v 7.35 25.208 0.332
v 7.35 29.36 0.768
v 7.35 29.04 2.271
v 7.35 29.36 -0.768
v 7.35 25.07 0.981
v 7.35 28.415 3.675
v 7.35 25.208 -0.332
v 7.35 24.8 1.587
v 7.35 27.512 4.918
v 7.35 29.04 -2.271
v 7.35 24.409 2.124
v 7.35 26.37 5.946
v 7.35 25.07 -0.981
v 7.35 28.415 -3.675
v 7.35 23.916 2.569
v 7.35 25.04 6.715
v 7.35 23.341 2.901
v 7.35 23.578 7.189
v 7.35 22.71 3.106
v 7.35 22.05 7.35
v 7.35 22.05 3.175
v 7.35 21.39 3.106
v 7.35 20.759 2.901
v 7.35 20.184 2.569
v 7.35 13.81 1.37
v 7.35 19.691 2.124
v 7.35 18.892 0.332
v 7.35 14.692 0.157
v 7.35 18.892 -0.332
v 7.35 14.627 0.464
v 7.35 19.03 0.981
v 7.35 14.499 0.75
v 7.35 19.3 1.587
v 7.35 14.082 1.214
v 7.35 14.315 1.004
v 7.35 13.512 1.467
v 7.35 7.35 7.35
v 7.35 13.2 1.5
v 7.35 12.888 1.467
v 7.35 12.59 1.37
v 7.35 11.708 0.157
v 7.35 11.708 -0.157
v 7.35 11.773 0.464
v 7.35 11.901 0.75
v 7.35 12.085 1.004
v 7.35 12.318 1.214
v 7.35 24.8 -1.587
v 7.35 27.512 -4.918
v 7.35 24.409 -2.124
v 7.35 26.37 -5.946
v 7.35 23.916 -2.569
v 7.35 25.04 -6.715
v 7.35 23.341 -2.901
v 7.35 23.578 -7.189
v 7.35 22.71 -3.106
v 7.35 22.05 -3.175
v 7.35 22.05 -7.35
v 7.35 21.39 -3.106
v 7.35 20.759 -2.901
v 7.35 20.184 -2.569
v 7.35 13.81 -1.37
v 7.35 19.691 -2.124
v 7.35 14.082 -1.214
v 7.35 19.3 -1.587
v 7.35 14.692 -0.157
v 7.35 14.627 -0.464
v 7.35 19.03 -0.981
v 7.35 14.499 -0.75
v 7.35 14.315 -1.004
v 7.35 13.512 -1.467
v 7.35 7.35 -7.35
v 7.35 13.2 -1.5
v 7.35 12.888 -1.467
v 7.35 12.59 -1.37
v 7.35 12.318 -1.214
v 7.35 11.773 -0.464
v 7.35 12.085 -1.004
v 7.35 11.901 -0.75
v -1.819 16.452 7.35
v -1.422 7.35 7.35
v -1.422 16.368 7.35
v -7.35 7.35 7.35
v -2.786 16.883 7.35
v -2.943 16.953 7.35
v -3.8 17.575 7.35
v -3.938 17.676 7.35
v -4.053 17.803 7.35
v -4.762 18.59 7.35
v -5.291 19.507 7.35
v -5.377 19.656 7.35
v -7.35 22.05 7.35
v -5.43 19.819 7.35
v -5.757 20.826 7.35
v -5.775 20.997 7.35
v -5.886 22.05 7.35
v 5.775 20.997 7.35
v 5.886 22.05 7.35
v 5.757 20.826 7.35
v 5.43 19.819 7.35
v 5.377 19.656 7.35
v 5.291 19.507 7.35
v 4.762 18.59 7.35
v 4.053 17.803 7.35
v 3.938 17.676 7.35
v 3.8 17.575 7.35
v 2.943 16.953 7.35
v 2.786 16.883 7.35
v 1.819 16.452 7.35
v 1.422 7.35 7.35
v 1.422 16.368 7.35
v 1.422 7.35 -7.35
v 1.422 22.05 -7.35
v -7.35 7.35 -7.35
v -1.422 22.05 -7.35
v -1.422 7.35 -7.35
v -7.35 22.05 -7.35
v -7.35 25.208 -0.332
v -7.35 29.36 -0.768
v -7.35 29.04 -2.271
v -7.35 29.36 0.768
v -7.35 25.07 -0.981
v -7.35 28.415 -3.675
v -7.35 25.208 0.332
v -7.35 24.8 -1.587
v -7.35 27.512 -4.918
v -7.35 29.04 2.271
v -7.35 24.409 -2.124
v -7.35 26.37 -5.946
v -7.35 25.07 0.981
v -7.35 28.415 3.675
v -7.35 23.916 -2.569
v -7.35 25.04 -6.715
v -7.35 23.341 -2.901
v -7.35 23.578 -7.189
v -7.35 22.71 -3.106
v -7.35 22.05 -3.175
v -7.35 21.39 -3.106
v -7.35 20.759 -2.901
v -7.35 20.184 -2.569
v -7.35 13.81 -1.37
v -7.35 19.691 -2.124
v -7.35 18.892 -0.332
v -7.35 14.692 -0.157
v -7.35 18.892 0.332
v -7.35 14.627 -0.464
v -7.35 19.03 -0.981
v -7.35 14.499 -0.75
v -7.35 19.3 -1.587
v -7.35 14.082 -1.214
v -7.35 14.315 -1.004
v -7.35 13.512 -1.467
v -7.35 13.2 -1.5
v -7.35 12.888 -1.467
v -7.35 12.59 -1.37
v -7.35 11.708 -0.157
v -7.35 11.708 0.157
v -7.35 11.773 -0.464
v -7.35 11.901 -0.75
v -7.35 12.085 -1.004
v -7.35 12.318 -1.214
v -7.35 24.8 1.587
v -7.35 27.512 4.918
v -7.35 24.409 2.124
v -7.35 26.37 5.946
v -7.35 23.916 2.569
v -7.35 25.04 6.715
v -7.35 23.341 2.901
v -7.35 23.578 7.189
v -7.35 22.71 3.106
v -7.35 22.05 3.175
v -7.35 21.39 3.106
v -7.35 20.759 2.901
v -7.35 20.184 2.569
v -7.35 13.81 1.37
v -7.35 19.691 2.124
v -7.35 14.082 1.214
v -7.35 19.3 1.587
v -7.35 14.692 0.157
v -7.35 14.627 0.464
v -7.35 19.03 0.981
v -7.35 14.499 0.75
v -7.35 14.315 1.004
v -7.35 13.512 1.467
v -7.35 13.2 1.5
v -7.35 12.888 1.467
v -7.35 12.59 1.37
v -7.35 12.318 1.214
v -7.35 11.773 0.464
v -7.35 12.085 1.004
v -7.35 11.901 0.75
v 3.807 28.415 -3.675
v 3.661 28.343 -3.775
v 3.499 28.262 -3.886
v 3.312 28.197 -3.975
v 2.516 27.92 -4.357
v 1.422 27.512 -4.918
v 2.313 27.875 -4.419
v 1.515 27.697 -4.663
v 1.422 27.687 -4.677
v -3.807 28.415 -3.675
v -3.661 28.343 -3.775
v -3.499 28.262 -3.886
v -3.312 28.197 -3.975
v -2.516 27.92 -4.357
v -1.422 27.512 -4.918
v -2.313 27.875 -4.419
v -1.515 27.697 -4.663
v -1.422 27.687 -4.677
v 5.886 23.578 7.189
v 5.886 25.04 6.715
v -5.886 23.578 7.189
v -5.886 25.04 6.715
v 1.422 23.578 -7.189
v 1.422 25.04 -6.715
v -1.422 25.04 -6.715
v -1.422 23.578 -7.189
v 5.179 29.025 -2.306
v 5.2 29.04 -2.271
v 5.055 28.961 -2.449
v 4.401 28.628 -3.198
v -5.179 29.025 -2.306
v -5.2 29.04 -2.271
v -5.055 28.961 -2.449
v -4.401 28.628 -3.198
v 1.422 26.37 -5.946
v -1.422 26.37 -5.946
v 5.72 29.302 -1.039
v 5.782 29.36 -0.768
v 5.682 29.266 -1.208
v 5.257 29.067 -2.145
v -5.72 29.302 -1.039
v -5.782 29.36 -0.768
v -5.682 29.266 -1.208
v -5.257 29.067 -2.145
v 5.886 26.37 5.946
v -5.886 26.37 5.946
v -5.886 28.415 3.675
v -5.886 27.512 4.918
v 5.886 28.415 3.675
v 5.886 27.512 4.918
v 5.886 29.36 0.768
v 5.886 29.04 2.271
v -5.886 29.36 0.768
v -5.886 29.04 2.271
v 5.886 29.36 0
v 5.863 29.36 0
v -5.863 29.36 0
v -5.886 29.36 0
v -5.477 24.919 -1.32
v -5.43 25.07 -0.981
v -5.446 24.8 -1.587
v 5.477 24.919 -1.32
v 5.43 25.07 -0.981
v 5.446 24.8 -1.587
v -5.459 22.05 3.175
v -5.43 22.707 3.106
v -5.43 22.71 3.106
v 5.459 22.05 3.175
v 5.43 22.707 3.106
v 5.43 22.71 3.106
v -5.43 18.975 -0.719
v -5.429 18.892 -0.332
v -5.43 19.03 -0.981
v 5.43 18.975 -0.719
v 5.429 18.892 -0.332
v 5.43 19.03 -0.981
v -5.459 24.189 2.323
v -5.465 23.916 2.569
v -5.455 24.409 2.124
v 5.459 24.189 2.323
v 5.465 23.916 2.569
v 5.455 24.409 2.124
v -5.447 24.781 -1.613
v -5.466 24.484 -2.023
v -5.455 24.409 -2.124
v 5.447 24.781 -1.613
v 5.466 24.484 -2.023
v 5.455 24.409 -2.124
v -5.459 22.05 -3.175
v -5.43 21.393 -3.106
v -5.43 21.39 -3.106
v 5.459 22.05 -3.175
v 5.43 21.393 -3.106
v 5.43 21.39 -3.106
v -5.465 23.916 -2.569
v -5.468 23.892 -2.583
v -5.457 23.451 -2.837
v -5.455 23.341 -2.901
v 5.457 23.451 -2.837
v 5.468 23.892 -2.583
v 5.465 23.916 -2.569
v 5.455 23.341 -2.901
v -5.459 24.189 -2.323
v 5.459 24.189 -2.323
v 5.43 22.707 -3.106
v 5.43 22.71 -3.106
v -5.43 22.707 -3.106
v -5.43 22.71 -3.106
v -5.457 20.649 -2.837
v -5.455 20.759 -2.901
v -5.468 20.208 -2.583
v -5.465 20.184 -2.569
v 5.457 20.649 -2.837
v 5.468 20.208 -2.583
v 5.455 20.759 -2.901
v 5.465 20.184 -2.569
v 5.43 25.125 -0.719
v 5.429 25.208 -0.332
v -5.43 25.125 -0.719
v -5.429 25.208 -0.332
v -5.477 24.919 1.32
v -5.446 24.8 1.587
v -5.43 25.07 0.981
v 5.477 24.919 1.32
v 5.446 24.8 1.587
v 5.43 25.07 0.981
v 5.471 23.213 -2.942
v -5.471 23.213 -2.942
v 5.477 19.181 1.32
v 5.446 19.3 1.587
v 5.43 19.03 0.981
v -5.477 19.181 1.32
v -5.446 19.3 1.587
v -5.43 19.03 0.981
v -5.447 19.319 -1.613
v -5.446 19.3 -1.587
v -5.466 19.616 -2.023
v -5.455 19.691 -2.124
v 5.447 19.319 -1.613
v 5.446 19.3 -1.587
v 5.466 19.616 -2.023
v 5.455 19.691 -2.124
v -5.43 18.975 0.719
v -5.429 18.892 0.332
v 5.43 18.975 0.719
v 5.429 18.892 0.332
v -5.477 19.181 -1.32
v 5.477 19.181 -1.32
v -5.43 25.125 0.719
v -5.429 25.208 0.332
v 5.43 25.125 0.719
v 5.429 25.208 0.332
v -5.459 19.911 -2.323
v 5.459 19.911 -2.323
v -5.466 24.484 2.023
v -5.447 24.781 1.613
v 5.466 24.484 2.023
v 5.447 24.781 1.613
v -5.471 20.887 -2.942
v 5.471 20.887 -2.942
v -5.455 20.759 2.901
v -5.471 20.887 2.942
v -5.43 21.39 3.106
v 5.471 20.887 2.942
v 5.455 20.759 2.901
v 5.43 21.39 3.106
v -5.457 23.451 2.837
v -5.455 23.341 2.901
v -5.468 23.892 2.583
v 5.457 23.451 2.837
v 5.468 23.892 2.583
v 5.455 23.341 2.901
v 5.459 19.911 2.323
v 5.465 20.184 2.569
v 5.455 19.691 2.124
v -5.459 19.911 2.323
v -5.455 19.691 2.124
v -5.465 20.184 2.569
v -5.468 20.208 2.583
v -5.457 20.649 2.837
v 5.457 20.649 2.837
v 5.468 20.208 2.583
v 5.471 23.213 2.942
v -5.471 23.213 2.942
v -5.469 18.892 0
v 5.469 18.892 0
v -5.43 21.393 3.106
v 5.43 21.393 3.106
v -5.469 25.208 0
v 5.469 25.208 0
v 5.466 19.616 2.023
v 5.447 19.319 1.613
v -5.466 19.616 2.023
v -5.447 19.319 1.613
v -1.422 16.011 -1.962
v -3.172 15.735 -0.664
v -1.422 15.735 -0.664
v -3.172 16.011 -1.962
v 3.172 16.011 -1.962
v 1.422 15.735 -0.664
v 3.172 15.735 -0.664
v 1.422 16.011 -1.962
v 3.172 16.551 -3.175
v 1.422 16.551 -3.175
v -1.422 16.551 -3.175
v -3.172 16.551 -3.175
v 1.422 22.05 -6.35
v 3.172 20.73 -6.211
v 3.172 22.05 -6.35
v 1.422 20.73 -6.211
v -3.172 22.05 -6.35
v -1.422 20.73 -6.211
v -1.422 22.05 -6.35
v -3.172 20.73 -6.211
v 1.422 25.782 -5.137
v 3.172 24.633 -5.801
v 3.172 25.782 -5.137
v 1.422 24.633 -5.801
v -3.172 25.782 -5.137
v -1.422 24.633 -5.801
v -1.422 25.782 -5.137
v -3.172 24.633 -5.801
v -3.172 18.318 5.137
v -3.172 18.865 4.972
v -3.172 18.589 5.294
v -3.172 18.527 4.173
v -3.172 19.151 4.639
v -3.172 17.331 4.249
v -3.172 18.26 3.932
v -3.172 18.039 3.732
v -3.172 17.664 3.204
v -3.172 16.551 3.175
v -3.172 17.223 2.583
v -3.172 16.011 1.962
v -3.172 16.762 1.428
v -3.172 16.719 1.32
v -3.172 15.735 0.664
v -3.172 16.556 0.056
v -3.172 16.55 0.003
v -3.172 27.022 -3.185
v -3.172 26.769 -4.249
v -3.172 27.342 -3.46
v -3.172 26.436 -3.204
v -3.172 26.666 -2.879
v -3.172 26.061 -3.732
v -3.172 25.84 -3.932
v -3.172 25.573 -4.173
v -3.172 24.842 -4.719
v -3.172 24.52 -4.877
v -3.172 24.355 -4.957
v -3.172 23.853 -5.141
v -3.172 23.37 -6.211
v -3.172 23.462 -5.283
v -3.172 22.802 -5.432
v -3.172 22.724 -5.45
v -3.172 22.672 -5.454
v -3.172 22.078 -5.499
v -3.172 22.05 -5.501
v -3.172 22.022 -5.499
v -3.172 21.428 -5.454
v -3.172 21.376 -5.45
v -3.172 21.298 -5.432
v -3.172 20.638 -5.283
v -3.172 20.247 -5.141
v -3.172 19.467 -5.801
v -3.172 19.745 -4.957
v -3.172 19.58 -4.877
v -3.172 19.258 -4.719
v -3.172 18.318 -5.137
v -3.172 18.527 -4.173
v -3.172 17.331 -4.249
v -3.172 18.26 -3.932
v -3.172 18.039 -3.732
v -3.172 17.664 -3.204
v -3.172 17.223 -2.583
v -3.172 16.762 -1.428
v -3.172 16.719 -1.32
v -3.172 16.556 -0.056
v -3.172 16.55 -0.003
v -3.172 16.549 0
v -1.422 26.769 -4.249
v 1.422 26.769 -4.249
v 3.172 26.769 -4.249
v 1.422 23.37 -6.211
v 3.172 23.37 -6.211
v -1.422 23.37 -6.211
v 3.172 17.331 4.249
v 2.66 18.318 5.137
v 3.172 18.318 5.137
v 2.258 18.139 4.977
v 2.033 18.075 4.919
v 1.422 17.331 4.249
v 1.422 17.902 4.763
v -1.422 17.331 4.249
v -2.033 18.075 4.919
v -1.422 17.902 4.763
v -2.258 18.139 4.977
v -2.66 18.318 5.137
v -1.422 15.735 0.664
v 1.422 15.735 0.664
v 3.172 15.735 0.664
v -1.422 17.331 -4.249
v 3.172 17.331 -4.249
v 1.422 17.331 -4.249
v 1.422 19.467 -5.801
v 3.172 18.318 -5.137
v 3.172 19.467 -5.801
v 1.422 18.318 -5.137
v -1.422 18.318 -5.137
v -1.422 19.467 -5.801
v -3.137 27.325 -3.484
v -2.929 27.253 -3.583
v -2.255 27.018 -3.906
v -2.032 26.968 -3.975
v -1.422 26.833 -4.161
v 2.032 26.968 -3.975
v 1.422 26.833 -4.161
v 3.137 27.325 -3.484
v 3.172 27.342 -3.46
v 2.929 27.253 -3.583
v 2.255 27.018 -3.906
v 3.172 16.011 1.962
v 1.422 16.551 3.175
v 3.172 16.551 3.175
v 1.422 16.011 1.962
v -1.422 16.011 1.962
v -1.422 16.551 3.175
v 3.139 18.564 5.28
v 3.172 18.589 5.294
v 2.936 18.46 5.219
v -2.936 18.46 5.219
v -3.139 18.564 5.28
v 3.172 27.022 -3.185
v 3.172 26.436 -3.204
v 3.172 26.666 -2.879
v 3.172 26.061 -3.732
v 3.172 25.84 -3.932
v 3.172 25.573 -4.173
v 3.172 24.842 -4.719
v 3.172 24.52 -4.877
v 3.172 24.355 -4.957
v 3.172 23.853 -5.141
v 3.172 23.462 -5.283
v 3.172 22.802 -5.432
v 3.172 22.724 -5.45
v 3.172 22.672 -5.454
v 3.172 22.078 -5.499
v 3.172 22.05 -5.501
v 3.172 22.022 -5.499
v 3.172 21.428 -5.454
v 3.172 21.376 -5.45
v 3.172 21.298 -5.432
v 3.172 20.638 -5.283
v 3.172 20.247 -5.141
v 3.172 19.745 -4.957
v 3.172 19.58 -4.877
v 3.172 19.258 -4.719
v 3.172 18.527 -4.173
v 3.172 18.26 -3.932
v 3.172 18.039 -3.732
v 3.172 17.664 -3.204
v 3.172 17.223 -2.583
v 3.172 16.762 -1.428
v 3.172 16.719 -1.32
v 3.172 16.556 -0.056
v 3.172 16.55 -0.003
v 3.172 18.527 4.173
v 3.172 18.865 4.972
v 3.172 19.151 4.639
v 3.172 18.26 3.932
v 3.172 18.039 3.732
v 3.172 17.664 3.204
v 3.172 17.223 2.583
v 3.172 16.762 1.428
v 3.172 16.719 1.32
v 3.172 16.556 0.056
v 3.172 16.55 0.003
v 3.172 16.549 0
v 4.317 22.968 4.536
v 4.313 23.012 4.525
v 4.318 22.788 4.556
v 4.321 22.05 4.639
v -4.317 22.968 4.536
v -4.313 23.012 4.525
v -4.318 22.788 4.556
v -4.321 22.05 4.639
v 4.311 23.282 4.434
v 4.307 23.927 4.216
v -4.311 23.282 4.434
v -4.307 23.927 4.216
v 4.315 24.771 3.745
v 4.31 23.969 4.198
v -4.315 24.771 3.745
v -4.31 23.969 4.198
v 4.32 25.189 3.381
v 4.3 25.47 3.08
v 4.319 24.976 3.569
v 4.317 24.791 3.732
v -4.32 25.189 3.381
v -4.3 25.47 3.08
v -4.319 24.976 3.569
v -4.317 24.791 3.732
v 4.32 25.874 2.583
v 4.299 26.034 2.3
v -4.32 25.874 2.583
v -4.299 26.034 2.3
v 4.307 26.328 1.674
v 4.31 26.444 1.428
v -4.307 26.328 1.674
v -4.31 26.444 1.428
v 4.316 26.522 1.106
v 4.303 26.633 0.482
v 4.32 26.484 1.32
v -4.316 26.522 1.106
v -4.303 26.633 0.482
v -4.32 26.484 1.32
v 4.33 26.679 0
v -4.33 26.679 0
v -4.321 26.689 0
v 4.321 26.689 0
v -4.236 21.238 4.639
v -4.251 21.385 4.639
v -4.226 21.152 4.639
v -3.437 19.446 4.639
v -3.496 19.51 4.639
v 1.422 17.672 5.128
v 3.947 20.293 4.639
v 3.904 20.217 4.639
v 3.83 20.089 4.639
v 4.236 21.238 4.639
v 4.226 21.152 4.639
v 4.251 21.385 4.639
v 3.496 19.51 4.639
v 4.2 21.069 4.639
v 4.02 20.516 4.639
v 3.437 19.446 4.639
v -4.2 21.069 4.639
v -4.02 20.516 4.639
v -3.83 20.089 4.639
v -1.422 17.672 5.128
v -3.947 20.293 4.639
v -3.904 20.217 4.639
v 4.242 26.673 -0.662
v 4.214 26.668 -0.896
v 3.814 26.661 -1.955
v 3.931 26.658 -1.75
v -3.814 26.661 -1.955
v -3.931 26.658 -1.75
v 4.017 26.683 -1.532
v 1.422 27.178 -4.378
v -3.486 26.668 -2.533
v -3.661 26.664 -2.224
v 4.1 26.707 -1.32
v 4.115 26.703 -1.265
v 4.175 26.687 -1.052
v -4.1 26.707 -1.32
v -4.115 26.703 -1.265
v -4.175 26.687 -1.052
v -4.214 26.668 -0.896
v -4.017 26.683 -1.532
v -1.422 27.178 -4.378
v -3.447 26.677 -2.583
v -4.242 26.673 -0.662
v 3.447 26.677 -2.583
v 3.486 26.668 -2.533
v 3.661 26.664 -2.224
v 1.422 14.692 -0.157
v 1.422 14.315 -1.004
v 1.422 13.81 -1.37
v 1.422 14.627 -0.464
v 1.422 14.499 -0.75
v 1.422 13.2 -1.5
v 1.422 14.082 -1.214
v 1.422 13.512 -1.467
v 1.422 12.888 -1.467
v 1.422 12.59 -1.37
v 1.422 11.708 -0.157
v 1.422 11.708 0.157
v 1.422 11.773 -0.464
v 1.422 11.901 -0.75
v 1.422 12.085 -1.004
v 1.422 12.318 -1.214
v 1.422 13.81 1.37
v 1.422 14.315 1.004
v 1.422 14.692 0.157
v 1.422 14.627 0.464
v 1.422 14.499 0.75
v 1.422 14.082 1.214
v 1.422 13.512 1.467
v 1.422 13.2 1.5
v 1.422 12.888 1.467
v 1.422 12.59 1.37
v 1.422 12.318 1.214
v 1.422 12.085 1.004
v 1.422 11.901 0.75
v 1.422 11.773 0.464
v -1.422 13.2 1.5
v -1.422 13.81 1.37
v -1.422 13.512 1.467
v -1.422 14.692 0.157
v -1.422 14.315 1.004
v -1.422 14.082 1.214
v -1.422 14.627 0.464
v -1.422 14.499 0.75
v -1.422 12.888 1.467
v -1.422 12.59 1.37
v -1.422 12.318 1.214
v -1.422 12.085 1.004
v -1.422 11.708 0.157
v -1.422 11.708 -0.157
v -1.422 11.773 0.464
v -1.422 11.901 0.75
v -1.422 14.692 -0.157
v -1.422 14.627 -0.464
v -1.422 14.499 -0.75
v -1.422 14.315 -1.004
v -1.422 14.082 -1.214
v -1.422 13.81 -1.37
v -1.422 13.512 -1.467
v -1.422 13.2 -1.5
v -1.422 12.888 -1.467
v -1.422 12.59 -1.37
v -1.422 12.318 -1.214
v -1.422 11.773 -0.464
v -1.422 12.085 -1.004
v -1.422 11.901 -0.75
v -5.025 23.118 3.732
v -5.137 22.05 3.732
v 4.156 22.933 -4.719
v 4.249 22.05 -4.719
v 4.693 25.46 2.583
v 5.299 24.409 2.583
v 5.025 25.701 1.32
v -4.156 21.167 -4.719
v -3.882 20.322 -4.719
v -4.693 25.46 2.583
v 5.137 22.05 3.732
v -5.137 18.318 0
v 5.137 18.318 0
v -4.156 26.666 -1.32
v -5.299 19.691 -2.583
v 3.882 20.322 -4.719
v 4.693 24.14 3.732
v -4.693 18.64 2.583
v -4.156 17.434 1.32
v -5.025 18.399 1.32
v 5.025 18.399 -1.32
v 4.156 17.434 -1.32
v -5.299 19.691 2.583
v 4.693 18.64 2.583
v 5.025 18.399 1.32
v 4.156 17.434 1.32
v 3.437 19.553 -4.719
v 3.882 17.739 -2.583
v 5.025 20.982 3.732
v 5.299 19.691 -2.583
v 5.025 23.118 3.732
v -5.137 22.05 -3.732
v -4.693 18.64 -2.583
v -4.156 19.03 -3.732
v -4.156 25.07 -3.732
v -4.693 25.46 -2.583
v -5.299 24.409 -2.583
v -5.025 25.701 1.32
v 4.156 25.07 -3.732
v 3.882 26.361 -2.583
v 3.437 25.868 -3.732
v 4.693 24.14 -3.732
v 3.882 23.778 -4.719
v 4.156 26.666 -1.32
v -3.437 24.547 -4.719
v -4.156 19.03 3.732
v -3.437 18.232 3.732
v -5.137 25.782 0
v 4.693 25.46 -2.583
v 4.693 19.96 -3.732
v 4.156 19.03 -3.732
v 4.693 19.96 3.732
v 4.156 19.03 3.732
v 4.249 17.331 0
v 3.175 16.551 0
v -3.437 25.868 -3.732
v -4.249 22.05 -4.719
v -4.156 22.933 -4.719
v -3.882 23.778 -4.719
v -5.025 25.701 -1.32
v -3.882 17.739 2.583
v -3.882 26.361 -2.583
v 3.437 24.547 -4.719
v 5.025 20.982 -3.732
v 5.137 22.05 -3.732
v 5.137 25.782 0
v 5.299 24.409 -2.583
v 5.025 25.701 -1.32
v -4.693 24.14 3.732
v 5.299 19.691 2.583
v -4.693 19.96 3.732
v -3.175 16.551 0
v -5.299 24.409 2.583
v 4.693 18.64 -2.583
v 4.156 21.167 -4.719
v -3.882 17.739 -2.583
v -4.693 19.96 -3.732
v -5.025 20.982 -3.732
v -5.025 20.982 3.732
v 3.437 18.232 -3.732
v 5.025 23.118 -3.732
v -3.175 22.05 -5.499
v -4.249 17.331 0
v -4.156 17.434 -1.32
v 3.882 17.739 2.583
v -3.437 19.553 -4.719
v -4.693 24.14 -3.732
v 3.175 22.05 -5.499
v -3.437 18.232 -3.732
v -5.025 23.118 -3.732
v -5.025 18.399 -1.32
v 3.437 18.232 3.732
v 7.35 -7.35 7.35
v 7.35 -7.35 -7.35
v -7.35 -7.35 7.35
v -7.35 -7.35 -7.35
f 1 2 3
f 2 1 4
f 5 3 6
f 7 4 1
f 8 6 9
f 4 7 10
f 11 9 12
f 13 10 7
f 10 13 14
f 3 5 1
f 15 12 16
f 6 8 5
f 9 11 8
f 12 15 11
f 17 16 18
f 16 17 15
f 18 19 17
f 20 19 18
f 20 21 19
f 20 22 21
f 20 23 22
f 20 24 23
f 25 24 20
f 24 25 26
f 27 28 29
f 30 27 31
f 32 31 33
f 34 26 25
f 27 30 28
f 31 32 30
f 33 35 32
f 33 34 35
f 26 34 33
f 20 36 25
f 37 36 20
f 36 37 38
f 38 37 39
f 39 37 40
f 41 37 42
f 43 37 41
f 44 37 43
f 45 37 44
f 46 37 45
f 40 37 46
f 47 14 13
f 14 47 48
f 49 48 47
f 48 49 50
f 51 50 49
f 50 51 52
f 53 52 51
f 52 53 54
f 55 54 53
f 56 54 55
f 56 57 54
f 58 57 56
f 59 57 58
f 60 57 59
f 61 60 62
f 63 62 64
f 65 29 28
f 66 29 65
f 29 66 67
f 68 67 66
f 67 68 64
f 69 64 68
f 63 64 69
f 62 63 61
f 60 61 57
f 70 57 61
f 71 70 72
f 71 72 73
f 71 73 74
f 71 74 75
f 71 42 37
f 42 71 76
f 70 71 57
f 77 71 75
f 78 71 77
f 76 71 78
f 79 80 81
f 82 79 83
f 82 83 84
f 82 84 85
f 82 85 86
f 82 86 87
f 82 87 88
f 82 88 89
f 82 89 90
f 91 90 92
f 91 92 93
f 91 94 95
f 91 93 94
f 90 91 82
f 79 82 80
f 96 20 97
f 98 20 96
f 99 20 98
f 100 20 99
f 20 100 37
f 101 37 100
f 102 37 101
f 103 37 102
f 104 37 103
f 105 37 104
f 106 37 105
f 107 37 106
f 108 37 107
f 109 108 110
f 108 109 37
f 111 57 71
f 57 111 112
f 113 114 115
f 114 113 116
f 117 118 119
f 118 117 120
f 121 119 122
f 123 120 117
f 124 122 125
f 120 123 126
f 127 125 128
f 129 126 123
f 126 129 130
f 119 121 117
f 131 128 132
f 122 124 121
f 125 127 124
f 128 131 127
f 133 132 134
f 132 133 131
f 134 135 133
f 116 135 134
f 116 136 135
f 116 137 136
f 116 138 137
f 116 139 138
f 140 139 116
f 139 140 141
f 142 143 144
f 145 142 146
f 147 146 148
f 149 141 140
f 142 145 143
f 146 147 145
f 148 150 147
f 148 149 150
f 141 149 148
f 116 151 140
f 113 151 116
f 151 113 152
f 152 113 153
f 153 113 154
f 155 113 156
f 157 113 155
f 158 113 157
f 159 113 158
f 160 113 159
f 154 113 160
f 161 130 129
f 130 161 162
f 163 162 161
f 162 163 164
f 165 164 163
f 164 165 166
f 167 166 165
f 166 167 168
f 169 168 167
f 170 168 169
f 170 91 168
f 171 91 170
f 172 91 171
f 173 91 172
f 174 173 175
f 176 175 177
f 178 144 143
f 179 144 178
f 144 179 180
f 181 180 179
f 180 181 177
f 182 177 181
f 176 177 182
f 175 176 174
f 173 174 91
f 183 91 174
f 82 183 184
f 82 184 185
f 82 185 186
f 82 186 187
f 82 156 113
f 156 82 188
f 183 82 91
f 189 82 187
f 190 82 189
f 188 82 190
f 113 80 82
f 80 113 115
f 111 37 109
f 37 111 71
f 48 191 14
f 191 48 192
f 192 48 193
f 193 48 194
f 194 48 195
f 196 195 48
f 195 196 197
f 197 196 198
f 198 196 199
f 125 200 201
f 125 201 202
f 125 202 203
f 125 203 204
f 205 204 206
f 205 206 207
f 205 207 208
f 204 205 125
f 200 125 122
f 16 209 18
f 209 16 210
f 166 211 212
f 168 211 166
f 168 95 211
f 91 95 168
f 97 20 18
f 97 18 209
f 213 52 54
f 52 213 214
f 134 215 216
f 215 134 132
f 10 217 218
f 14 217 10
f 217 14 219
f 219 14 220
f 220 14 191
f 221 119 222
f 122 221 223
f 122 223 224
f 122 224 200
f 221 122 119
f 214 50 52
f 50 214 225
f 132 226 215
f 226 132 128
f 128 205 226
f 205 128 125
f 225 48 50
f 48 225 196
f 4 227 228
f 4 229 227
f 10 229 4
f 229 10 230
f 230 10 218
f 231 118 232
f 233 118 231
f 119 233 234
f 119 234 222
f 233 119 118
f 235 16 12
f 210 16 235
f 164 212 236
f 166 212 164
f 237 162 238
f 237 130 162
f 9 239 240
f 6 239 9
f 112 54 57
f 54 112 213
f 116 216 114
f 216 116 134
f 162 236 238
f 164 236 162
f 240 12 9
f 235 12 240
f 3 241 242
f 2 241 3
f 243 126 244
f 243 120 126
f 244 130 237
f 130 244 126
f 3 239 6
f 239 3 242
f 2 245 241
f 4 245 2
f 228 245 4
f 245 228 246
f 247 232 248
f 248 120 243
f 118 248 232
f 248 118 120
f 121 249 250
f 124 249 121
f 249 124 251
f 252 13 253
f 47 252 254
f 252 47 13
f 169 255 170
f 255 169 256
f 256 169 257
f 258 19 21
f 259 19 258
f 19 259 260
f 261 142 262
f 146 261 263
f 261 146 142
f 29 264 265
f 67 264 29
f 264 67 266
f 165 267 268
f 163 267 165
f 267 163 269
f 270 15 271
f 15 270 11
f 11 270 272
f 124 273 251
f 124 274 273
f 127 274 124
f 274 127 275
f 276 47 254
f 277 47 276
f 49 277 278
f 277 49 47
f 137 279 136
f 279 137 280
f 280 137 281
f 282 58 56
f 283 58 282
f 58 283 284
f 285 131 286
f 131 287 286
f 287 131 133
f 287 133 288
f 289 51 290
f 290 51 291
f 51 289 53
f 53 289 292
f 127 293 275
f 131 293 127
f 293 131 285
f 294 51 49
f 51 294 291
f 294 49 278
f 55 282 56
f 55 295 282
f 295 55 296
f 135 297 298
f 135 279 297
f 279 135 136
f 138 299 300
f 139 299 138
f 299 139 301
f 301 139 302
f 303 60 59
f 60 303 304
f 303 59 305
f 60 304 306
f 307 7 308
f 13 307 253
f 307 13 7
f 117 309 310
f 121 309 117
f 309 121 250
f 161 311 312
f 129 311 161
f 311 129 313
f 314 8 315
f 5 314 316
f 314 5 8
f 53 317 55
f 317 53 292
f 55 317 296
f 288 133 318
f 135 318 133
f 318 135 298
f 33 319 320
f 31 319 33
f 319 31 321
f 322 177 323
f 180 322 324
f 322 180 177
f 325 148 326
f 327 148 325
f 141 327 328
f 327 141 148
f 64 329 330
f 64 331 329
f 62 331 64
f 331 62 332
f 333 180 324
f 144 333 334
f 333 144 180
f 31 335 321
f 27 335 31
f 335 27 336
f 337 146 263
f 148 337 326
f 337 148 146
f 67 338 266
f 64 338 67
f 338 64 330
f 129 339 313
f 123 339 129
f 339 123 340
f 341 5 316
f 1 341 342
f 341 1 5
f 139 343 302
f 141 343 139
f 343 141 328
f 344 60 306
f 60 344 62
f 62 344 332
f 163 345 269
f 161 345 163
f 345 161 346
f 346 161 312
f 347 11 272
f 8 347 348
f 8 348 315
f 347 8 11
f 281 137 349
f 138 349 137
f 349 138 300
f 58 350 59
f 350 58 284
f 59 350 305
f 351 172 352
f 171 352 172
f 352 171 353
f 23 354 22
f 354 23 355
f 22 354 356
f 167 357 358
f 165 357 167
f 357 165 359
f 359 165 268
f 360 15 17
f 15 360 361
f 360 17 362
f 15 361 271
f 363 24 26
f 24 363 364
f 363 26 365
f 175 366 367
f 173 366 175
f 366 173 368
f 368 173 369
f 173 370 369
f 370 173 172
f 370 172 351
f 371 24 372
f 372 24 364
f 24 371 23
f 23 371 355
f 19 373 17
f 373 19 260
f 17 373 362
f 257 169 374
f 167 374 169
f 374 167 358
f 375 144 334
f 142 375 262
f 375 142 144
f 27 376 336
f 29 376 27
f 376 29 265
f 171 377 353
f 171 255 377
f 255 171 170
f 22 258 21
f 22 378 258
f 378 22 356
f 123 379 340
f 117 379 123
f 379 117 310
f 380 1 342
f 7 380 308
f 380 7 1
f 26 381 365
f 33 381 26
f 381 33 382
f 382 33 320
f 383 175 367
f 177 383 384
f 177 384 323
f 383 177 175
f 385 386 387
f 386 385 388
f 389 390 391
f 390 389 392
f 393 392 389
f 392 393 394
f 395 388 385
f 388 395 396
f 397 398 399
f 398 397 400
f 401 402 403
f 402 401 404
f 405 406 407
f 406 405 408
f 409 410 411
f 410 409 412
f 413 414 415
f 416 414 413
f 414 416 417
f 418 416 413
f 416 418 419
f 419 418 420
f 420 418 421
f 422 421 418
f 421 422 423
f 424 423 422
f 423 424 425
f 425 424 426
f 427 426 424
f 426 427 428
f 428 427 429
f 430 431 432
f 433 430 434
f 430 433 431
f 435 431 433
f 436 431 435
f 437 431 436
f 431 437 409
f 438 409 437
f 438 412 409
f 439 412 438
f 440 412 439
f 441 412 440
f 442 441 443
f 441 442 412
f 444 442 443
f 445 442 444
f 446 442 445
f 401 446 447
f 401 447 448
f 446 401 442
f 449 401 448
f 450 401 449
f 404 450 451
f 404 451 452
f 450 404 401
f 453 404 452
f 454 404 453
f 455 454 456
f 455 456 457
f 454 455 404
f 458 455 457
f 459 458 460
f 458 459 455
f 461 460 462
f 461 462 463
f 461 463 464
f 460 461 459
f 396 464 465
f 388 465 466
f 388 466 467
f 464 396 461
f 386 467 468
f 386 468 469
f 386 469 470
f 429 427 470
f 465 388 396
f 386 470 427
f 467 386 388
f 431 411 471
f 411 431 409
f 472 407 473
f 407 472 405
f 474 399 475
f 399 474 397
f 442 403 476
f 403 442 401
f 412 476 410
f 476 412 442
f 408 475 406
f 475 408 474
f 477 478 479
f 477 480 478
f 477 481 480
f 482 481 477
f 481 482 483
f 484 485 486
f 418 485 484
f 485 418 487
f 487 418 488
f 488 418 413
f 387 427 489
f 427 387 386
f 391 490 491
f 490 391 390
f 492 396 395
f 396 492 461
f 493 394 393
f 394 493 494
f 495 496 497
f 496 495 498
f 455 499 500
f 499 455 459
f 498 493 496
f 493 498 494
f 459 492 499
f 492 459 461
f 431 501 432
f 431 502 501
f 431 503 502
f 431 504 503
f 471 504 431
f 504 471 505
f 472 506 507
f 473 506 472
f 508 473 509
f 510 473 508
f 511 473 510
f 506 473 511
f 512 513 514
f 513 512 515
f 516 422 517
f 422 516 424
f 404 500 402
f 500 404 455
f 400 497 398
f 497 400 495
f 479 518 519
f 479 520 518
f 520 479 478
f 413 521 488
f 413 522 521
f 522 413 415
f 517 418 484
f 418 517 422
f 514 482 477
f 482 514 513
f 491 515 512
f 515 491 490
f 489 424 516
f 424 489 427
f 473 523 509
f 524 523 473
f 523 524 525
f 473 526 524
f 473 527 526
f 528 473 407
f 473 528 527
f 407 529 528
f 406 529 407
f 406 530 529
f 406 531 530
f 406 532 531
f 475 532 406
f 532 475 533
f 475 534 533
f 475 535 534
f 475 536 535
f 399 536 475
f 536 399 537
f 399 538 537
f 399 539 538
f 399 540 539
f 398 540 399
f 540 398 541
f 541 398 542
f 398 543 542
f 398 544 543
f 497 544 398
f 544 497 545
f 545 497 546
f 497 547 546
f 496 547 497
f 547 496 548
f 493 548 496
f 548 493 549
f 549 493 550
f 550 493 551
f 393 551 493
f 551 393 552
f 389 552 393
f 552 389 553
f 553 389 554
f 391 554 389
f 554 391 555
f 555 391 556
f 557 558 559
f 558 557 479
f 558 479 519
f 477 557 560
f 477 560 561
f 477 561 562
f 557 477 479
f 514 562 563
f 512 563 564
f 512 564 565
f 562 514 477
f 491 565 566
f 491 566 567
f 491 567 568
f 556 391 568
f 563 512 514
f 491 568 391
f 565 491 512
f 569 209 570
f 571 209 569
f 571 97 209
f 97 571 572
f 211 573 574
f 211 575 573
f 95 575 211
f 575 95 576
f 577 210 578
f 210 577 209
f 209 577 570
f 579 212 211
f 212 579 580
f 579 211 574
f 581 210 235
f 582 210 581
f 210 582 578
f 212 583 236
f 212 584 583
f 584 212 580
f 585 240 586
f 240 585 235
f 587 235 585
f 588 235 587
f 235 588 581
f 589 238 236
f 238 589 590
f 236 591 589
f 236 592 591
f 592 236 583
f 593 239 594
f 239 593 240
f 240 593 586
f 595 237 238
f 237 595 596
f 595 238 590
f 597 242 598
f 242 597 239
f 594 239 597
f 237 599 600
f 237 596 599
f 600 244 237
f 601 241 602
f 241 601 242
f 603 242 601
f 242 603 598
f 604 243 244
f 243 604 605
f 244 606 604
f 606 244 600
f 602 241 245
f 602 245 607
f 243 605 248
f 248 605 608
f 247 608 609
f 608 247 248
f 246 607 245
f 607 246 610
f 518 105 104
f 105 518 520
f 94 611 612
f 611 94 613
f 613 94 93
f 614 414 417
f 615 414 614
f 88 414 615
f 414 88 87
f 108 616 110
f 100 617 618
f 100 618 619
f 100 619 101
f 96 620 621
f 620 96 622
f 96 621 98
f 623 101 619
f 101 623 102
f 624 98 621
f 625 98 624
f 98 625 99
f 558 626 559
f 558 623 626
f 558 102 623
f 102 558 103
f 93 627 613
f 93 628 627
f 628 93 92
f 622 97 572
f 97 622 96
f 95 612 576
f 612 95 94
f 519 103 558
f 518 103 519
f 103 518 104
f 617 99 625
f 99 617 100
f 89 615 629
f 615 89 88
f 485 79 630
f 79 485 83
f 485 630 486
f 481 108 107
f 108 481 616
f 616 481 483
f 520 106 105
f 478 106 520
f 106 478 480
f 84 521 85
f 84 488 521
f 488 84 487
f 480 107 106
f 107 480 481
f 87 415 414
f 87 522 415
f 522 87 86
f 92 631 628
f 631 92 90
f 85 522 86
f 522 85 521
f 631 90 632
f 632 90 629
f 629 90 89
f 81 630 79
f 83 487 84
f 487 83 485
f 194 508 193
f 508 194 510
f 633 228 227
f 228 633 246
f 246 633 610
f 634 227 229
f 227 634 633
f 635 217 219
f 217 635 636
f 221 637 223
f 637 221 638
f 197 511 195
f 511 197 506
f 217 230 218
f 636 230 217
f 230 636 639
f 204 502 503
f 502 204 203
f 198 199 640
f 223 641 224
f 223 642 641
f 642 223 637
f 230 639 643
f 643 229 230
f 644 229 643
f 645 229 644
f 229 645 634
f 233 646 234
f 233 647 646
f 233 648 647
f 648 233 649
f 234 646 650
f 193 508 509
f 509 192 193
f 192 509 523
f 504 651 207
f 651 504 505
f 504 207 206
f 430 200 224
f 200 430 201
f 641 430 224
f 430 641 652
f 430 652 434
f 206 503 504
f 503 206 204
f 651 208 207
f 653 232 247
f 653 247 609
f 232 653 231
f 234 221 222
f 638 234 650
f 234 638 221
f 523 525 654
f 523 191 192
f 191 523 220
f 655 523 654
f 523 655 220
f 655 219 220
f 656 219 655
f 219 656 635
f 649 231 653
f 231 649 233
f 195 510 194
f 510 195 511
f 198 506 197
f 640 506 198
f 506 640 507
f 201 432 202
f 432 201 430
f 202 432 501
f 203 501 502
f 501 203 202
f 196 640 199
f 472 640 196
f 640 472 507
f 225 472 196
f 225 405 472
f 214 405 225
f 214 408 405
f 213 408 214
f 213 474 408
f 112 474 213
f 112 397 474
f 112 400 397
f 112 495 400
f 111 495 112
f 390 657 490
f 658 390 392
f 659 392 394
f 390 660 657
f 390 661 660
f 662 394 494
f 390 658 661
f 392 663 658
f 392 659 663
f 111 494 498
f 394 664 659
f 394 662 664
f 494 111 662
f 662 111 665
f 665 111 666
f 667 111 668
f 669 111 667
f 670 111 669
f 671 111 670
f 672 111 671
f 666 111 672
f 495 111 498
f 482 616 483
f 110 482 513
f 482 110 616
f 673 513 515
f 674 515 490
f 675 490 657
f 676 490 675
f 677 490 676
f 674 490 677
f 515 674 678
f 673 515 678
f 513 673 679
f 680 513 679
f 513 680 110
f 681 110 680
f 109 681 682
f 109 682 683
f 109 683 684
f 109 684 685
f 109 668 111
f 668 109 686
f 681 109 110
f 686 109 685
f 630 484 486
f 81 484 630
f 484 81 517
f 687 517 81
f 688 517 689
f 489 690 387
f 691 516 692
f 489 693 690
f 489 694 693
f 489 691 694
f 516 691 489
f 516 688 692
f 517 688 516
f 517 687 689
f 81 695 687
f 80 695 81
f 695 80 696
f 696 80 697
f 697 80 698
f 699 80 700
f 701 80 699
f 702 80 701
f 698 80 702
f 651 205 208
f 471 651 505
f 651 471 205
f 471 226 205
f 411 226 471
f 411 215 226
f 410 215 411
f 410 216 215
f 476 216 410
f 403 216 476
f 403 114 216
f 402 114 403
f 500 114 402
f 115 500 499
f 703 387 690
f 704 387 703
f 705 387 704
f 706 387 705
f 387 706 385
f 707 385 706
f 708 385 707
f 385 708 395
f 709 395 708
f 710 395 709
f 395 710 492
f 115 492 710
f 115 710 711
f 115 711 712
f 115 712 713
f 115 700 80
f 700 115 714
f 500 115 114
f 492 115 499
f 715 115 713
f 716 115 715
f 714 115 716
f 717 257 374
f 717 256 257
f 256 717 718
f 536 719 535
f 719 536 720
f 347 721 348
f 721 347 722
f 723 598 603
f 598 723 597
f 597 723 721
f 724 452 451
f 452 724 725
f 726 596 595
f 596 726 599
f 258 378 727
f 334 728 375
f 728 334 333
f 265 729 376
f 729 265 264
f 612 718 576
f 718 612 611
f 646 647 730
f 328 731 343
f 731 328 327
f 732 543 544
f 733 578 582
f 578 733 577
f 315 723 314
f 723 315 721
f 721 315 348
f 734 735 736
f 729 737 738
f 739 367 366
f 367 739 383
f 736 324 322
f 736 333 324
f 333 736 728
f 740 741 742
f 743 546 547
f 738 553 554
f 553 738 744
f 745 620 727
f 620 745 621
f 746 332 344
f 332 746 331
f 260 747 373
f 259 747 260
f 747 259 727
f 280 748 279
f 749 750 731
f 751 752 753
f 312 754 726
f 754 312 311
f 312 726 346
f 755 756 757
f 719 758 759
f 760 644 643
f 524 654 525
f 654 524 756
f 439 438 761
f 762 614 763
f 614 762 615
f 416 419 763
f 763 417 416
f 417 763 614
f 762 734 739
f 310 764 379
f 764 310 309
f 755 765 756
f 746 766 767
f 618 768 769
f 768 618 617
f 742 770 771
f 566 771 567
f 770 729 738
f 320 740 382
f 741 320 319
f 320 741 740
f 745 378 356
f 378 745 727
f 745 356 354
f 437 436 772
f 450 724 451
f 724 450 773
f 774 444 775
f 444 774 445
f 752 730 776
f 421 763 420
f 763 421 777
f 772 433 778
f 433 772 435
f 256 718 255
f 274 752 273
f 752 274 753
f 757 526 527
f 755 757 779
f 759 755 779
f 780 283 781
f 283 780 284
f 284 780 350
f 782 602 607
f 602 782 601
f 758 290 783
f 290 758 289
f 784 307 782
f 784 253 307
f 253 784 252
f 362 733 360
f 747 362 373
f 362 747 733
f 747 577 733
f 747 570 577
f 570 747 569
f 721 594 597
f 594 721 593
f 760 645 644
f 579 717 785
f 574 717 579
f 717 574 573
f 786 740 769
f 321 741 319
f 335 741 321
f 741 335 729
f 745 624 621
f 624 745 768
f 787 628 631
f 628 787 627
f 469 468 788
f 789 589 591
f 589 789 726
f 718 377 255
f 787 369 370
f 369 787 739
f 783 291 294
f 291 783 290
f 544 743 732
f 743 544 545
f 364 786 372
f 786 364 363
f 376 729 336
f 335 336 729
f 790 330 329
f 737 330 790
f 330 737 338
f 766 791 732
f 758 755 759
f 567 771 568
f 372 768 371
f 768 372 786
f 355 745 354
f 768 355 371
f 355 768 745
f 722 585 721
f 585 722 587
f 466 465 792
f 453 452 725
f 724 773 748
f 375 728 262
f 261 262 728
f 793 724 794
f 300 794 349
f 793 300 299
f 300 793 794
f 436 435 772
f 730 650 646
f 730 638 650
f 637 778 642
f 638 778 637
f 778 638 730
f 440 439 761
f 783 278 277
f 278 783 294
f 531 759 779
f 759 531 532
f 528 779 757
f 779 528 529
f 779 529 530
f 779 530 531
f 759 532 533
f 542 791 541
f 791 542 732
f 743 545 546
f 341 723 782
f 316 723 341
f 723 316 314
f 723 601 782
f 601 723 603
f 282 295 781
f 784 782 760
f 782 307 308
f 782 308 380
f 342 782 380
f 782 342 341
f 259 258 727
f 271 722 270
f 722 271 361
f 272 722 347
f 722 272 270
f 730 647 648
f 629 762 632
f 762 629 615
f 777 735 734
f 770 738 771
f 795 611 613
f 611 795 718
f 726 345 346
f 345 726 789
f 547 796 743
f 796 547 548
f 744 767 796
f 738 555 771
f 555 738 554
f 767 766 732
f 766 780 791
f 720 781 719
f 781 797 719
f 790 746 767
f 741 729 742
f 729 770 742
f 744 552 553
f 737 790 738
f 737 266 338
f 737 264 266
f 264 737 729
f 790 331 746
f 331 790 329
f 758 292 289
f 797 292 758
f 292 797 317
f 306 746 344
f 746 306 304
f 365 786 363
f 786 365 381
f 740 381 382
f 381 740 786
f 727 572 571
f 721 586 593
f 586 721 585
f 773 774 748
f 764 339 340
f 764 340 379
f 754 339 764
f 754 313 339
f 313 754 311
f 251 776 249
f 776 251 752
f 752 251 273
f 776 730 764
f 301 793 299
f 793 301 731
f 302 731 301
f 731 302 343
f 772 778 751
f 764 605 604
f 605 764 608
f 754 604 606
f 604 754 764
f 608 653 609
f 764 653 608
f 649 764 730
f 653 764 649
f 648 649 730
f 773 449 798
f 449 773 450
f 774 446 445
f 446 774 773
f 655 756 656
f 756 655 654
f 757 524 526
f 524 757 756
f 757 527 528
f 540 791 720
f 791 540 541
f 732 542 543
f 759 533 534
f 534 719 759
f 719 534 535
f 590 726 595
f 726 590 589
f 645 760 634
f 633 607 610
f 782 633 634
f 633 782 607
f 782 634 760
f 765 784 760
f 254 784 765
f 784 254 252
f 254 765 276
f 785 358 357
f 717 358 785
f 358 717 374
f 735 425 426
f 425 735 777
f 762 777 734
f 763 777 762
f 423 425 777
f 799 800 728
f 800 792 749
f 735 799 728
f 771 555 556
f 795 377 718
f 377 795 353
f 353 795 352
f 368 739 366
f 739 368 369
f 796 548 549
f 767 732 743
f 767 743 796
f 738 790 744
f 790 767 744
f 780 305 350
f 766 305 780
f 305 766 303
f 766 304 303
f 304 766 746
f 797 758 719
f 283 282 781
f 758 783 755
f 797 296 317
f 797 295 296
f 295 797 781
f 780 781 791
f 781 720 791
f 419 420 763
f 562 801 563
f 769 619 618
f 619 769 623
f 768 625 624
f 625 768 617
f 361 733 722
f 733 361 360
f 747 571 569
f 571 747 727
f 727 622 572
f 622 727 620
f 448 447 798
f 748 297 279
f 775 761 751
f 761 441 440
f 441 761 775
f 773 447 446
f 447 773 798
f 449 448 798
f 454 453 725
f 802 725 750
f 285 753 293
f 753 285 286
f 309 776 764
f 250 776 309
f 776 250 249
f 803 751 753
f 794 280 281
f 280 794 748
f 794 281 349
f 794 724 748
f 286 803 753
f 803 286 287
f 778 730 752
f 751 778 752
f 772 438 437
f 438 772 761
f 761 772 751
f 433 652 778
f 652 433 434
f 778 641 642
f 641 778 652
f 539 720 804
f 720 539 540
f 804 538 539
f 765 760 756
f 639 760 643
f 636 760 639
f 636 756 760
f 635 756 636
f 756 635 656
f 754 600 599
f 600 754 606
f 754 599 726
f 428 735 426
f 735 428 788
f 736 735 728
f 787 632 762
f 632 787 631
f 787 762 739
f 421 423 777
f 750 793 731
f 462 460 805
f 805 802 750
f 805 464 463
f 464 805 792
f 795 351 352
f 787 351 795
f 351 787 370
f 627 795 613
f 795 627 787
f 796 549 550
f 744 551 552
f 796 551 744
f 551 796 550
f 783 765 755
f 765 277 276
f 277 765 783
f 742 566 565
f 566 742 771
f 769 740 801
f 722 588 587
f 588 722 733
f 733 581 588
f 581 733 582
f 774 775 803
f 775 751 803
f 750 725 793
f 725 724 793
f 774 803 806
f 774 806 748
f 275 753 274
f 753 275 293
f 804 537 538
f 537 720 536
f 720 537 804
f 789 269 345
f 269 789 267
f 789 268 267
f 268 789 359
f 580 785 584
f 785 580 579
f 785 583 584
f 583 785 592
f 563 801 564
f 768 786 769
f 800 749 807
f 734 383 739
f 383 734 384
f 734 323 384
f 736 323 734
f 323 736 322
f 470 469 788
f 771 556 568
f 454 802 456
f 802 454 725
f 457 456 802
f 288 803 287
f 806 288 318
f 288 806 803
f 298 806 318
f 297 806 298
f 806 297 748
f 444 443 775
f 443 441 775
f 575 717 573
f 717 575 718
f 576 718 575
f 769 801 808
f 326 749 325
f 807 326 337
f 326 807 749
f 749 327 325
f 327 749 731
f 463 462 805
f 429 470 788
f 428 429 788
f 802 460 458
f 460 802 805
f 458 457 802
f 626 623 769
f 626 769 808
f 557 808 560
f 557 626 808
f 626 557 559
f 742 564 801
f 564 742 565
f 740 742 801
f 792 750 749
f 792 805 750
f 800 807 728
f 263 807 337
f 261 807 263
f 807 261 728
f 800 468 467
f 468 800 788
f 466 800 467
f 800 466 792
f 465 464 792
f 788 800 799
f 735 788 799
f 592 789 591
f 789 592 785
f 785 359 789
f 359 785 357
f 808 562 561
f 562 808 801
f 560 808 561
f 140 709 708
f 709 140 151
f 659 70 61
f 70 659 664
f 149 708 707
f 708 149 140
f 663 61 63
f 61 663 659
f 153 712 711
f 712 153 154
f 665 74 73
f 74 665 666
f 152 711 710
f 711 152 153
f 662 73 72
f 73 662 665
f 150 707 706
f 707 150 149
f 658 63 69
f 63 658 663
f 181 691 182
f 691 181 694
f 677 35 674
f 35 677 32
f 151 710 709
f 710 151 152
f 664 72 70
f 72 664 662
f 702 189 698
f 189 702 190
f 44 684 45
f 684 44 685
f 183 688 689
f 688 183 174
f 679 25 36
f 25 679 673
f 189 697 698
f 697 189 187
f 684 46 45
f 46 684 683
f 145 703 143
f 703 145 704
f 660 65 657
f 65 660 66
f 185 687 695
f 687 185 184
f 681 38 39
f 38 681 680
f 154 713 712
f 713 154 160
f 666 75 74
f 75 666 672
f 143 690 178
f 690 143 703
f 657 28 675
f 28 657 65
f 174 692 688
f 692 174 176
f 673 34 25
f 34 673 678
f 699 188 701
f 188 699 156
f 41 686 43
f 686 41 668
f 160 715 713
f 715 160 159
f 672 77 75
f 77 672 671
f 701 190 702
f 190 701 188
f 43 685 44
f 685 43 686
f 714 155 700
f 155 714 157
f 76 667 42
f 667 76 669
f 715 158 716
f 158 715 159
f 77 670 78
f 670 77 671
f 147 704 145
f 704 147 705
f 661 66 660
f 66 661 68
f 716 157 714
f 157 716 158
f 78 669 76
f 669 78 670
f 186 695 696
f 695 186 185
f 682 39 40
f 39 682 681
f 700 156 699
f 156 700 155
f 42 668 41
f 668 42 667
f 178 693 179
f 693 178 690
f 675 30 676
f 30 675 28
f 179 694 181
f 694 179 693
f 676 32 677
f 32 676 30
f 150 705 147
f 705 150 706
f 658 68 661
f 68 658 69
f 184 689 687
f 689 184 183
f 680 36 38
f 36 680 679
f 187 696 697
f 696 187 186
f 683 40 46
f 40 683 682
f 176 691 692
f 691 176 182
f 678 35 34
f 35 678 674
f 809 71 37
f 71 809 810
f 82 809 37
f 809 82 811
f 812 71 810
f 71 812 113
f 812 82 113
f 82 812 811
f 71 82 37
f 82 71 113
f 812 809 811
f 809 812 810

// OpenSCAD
socket_extra=2;

module socket(ball_dia, screw_dia, adisp) {

assign(ball_rad=ball_dia/2){
assign(screw_rad=screw_dia/2){
assign(body_height = ball_dia+socket_extra){
assign(cone_min=screw_rad/cos(adisp)){
assign(cone_max=body_height*tan(adisp)+cone_min){

	%if (1) {
		// Show ball and attachment screw
		sphere(r=ball_rad, center=true, $fn=30);
		for (a = [adisp, 0, -adisp]) {
			rotate([0, a, 0])
				cylinder(r=screw_rad, h=ball_dia, $fn=30);
		}
	}
	difference() {
		union() {
			translate([0, -body_height*.5, 0])
				cube([body_height, body_height, body_height], true);
			rotate([0, 90, 0])
				cylinder(r=body_height/2, h=body_height, center=true, $fn=30);
		}
		
		cube([screw_dia, 1000, 1000], true);
		sphere(r=ball_rad, center=true, $fn=30);

		// relieve center of socketball_dia*tan(adisp)+
		rotate([0, 90, 0]) {
			cylinder(r=ball_dia*.25, h=body_height+2,
											center=true, $fn=30);
			cylinder(r=ball_rad, h=ball_rad*cos(adisp)+screw_dia-2,
											center=true, $fn=30);
		}

		// create clearance for screw attaching ball to rod
		intersection() {
			rotate([0, 90, 0]) rotate_extrude($fn=30)
					polygon(points=[[0,           -cone_min],
				 					 [0,            cone_min],
									 [body_height,  cone_max],
									 [body_height, -cone_max]],
							 paths=[[0, 1, 2, 3]]);
			translate([0, 50, 50]) cube(100, center=true);
		}

		for (r = [0,-90]) {
			rotate([r, 0, 0])
				cylinder(r1=cone_min, r2=cone_max, h=body_height, $fn=30);
		}
		translate([0, -(ball_rad+1.5+1), 0])
			rotate([0, 90, 0])
				cylinder(r=1.5, h=body_height+1, center=true, $fn=30);

	}
}}}}}}


ball_dia = .5*25.4;
screw_dia = .112*25.4;
adisp = 30; // Max angular displacement of rod to socket

union() {
	cube([ball_dia+socket_extra,
		  ball_dia+socket_extra,
		  ball_dia+socket_extra], center=true);
	translate([0, (ball_dia+socket_extra)*1.5, 0])
		socket(ball_dia, screw_dia, adisp);
}
